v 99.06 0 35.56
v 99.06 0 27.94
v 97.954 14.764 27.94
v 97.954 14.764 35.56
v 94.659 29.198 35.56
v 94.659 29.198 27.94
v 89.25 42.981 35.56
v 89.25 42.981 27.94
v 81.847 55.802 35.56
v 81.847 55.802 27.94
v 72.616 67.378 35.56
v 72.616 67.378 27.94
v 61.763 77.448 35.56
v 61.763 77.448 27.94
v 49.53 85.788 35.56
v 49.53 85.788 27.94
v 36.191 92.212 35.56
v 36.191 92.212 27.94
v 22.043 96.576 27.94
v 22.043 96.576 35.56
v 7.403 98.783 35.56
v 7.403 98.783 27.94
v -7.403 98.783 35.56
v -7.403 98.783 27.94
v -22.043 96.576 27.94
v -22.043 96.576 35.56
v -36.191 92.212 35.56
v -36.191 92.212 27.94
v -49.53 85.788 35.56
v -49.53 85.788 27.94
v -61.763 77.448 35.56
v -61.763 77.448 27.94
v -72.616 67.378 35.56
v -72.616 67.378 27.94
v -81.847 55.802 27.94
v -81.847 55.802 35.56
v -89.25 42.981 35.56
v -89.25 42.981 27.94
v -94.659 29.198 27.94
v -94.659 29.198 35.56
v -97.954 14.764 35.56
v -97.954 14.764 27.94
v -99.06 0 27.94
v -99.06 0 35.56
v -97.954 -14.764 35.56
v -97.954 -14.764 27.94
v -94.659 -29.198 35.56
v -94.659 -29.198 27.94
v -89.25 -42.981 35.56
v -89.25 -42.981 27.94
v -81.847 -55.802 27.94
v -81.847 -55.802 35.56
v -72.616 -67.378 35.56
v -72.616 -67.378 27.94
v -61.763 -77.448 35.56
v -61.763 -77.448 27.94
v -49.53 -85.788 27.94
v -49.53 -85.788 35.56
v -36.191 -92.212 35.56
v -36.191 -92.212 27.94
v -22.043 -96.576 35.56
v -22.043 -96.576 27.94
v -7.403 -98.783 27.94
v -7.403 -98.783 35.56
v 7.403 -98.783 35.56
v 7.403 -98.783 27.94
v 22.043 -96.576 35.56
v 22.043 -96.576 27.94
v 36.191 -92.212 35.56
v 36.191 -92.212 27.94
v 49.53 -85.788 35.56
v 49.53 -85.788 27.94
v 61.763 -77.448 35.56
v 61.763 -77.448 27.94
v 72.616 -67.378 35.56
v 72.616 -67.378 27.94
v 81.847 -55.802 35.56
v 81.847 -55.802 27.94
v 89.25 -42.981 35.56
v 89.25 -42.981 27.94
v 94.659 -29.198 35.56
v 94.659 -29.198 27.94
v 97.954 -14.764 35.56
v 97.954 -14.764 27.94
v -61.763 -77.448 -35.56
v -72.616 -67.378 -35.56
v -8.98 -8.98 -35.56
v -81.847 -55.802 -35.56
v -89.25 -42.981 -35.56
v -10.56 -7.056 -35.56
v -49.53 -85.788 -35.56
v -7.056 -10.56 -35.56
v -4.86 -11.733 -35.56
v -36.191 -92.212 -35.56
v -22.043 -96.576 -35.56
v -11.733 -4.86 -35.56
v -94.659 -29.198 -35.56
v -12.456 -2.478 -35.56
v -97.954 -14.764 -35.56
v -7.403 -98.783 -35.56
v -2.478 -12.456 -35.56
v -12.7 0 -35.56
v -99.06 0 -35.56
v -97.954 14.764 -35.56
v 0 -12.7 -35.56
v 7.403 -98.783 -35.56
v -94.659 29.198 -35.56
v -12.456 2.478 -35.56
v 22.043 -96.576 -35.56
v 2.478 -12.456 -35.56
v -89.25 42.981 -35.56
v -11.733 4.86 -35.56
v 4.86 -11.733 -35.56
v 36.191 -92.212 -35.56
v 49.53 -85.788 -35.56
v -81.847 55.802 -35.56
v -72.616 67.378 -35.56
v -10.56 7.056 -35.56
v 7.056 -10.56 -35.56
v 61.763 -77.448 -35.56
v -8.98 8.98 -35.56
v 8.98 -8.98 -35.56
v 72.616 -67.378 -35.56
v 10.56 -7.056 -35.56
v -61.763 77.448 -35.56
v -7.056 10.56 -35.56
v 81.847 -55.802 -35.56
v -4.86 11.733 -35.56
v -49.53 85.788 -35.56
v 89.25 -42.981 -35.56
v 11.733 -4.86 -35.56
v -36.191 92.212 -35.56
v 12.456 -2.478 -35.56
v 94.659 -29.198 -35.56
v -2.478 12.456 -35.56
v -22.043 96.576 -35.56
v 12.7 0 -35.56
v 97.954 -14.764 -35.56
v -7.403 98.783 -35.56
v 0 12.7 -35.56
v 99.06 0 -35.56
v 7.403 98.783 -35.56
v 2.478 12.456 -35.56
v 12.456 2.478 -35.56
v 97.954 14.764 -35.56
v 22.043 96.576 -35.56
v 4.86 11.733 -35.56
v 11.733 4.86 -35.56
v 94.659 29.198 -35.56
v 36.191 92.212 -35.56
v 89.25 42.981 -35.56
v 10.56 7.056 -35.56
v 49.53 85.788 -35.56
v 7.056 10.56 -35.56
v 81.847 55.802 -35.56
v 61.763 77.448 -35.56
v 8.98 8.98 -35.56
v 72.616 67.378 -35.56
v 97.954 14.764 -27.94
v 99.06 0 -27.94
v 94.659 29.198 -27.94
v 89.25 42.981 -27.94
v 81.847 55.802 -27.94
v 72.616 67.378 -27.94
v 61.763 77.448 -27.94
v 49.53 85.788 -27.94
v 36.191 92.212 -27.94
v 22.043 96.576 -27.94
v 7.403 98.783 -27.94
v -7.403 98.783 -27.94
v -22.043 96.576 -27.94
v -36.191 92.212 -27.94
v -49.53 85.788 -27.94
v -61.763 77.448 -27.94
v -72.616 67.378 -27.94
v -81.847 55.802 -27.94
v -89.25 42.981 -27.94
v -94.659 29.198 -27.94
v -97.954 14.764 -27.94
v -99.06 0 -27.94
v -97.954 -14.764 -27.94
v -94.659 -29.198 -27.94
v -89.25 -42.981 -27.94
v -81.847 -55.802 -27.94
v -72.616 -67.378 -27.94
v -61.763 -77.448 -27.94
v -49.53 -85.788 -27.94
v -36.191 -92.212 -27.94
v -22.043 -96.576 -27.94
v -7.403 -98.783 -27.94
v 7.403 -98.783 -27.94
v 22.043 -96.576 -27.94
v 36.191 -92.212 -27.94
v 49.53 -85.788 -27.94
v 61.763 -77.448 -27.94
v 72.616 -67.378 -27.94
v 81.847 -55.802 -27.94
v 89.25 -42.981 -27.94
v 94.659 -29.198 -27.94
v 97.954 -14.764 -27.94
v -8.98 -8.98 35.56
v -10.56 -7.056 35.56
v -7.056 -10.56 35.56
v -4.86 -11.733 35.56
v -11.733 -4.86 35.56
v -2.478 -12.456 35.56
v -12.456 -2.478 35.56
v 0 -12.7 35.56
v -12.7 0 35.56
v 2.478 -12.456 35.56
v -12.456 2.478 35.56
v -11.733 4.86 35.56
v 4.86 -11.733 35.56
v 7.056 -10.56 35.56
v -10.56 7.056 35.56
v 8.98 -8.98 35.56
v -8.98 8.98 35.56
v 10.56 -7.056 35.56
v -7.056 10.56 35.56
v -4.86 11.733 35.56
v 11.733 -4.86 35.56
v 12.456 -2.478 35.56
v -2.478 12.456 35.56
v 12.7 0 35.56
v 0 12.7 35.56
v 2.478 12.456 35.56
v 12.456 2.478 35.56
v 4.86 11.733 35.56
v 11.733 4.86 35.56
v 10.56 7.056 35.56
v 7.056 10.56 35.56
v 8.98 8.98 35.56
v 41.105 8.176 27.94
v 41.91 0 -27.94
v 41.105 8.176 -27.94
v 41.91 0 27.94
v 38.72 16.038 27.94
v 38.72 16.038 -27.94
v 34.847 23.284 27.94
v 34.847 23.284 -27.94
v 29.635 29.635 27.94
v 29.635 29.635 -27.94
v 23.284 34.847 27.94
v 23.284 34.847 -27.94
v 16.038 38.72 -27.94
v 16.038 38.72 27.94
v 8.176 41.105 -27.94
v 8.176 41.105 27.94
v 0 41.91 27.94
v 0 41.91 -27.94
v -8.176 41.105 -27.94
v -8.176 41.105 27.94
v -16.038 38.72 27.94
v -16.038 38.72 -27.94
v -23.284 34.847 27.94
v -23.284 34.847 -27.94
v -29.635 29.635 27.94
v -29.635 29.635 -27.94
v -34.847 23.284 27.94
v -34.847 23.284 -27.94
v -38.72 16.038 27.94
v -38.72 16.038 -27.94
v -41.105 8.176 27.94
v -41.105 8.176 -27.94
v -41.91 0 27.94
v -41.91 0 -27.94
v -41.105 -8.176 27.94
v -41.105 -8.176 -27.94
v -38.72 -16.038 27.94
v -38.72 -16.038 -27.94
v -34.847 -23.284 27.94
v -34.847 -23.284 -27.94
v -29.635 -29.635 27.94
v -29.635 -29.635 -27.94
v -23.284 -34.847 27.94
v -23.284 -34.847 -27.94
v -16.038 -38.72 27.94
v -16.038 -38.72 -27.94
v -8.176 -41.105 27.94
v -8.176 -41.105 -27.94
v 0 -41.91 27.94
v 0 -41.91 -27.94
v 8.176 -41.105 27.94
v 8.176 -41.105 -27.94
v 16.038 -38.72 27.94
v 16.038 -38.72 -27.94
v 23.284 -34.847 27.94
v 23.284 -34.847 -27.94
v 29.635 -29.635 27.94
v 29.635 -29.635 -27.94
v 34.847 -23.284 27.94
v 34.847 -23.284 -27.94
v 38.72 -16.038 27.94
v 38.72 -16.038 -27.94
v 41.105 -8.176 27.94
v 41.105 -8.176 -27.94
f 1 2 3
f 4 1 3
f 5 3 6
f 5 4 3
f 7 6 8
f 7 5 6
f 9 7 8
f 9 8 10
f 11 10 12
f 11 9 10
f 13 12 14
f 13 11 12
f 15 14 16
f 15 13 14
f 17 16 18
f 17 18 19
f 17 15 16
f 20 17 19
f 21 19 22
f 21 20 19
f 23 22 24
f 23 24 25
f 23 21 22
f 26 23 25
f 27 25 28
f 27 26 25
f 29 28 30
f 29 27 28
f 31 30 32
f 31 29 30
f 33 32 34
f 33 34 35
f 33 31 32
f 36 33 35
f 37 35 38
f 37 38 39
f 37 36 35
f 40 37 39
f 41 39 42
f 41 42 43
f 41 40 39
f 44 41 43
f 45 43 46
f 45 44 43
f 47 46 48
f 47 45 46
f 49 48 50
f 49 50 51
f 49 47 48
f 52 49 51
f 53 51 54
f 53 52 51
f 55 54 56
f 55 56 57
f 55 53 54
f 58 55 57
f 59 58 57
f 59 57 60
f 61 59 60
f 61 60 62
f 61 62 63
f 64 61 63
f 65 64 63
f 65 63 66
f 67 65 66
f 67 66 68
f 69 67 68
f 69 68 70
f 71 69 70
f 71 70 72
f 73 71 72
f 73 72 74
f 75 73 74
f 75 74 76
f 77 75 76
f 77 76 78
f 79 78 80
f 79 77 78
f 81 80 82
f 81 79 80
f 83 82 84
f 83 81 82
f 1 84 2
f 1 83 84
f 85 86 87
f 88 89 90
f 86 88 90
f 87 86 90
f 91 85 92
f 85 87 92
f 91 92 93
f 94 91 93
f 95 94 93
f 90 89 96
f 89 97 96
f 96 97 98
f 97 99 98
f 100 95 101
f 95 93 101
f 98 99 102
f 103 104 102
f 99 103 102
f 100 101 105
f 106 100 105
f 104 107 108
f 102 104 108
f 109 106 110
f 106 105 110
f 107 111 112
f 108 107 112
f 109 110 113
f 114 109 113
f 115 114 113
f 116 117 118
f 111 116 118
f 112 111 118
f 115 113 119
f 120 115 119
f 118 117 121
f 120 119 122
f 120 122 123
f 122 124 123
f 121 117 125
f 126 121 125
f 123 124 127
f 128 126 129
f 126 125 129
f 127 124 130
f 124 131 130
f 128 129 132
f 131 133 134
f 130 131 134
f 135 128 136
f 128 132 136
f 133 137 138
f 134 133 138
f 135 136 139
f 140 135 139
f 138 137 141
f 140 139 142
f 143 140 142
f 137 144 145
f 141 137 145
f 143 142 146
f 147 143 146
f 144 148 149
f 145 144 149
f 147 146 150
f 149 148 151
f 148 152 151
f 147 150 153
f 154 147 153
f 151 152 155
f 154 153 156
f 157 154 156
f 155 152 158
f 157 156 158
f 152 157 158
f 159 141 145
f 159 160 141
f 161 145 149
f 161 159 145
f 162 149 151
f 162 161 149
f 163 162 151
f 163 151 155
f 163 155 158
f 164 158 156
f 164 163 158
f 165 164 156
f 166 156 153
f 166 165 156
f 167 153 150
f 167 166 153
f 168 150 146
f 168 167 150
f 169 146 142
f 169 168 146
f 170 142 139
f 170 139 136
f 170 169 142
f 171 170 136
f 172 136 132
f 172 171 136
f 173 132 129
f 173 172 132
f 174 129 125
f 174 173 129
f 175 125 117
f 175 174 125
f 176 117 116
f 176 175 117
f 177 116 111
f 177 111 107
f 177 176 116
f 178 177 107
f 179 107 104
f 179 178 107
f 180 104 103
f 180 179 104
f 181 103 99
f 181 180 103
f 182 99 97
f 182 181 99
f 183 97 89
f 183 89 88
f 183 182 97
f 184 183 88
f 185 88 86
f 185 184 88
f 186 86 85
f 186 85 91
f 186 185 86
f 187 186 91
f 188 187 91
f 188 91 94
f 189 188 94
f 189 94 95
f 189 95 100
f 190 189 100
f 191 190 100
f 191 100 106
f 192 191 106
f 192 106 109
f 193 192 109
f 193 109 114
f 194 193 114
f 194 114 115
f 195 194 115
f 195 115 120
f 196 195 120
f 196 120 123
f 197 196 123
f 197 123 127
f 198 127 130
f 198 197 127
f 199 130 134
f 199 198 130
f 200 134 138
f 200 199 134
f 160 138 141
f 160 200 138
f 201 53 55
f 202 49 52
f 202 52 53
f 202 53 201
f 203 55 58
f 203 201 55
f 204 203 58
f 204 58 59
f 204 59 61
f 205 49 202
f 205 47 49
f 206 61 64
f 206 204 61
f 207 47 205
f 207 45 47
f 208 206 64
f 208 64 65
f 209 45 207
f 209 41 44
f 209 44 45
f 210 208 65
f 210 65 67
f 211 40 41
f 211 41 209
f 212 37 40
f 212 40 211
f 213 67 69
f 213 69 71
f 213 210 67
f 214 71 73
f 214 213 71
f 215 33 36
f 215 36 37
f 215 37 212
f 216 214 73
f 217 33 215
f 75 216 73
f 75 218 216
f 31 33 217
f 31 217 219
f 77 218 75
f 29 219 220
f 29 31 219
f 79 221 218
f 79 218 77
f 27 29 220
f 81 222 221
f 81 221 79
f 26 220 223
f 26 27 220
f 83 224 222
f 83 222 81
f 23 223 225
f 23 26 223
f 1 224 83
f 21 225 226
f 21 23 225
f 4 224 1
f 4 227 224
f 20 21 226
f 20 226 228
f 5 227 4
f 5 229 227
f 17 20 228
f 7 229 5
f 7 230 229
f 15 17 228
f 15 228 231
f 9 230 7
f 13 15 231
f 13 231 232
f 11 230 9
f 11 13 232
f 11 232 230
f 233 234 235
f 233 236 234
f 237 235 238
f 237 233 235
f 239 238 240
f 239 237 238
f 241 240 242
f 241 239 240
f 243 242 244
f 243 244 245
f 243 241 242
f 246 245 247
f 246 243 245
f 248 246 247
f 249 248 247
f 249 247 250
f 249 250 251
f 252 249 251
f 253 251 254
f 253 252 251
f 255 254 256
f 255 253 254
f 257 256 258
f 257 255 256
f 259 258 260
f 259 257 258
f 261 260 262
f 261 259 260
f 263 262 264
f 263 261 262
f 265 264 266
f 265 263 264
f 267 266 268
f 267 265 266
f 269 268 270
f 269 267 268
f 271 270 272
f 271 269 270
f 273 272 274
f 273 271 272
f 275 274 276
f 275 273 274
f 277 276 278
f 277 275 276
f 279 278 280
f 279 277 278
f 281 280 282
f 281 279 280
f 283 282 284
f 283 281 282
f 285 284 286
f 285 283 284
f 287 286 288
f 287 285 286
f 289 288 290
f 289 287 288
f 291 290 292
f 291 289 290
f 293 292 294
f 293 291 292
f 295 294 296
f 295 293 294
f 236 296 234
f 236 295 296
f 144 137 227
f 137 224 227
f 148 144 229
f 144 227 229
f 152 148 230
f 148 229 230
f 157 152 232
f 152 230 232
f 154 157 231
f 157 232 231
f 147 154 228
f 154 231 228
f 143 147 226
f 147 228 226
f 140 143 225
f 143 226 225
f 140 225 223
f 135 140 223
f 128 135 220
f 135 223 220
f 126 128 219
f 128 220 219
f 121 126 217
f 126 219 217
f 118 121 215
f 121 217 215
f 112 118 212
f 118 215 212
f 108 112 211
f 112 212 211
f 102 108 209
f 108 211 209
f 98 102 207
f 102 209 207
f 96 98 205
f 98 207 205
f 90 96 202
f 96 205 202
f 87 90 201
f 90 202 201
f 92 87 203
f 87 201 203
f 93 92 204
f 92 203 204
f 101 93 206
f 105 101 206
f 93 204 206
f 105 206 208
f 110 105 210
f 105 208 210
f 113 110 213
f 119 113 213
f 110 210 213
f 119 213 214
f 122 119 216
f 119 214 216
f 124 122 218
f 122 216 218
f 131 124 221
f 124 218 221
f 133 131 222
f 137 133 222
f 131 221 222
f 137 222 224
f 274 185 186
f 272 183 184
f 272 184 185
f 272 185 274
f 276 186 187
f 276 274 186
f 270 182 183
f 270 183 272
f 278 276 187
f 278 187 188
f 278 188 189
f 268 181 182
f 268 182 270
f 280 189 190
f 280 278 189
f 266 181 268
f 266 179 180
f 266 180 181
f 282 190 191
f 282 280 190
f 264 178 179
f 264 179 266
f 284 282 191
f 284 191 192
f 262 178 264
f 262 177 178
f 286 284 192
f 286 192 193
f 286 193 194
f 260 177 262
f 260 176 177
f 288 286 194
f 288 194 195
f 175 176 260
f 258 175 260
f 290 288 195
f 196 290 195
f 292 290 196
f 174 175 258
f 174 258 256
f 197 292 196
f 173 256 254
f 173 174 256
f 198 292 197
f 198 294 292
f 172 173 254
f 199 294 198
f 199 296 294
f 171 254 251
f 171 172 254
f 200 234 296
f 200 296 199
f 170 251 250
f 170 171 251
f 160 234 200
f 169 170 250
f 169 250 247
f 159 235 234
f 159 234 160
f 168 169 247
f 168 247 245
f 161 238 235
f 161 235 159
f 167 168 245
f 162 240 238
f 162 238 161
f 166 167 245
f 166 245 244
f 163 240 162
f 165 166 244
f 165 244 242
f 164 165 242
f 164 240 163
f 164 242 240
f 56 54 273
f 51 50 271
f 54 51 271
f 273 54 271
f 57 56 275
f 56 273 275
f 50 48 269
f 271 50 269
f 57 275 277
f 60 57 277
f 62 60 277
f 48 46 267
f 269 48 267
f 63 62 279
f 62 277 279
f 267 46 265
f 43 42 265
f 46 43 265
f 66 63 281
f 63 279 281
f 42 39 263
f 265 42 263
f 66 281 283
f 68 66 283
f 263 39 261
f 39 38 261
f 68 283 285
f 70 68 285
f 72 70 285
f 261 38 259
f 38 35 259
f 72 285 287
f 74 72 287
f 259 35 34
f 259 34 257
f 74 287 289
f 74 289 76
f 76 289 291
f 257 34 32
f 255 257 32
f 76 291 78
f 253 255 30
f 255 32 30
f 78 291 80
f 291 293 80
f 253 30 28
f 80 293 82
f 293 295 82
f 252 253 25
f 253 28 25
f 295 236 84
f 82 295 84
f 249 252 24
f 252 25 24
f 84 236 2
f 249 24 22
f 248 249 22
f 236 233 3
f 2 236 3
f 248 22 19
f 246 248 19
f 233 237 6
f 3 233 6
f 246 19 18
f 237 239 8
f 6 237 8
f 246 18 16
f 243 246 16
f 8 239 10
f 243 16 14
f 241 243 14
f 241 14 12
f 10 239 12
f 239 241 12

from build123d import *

# Parameters (mm, degrees)
SKETCH1_R                = 99.06
BOSS_EXTRUDE1_DEPTH      = 35.56
BOSS_EXTRUDE1_DEPTH_BACK = 35.56
SKETCH3_OUTSIDE_W        = 257.934
SKETCH3_OUTSIDE_H        = 257.934
SKETCH3_OUTSIDE_R        = 41.91
CUT_EXTRUDE1_DEPTH       = 27.94
CUT_EXTRUDE1_DEPTH_BACK  = 27.94
SKETCH4_R                = 12.7
CUT_EXTRUDE2_DEPTH       = 36.56
CUT_EXTRUDE2_DEPTH_BACK  = 36.56


with BuildPart() as part:
    # Sketch1 → Boss-Extrude1 (new body, two sides)
    with BuildSketch(Plane.XY) as boss_extrude1_sk:
        Circle(SKETCH1_R)
    extrude(amount=BOSS_EXTRUDE1_DEPTH)
    extrude(boss_extrude1_sk.sketch, amount=-BOSS_EXTRUDE1_DEPTH_BACK)

    # Sketch3 outside → Cut-Extrude1 (cut, two sides)
    with BuildSketch(Plane.XY) as cut_extrude1_sk:
        Rectangle(SKETCH3_OUTSIDE_W, SKETCH3_OUTSIDE_H)
        Circle(SKETCH3_OUTSIDE_R, mode=Mode.SUBTRACT)
    extrude(amount=CUT_EXTRUDE1_DEPTH, mode=Mode.SUBTRACT)
    extrude(cut_extrude1_sk.sketch, amount=-CUT_EXTRUDE1_DEPTH_BACK, mode=Mode.SUBTRACT)

    # Sketch4 → Cut-Extrude2 (cut, two sides)
    with BuildSketch(Plane.XY) as cut_extrude2_sk:
        Circle(SKETCH4_R)
    extrude(amount=CUT_EXTRUDE2_DEPTH, mode=Mode.SUBTRACT)
    extrude(cut_extrude2_sk.sketch, amount=-CUT_EXTRUDE2_DEPTH_BACK, mode=Mode.SUBTRACT)


solid = part.part
